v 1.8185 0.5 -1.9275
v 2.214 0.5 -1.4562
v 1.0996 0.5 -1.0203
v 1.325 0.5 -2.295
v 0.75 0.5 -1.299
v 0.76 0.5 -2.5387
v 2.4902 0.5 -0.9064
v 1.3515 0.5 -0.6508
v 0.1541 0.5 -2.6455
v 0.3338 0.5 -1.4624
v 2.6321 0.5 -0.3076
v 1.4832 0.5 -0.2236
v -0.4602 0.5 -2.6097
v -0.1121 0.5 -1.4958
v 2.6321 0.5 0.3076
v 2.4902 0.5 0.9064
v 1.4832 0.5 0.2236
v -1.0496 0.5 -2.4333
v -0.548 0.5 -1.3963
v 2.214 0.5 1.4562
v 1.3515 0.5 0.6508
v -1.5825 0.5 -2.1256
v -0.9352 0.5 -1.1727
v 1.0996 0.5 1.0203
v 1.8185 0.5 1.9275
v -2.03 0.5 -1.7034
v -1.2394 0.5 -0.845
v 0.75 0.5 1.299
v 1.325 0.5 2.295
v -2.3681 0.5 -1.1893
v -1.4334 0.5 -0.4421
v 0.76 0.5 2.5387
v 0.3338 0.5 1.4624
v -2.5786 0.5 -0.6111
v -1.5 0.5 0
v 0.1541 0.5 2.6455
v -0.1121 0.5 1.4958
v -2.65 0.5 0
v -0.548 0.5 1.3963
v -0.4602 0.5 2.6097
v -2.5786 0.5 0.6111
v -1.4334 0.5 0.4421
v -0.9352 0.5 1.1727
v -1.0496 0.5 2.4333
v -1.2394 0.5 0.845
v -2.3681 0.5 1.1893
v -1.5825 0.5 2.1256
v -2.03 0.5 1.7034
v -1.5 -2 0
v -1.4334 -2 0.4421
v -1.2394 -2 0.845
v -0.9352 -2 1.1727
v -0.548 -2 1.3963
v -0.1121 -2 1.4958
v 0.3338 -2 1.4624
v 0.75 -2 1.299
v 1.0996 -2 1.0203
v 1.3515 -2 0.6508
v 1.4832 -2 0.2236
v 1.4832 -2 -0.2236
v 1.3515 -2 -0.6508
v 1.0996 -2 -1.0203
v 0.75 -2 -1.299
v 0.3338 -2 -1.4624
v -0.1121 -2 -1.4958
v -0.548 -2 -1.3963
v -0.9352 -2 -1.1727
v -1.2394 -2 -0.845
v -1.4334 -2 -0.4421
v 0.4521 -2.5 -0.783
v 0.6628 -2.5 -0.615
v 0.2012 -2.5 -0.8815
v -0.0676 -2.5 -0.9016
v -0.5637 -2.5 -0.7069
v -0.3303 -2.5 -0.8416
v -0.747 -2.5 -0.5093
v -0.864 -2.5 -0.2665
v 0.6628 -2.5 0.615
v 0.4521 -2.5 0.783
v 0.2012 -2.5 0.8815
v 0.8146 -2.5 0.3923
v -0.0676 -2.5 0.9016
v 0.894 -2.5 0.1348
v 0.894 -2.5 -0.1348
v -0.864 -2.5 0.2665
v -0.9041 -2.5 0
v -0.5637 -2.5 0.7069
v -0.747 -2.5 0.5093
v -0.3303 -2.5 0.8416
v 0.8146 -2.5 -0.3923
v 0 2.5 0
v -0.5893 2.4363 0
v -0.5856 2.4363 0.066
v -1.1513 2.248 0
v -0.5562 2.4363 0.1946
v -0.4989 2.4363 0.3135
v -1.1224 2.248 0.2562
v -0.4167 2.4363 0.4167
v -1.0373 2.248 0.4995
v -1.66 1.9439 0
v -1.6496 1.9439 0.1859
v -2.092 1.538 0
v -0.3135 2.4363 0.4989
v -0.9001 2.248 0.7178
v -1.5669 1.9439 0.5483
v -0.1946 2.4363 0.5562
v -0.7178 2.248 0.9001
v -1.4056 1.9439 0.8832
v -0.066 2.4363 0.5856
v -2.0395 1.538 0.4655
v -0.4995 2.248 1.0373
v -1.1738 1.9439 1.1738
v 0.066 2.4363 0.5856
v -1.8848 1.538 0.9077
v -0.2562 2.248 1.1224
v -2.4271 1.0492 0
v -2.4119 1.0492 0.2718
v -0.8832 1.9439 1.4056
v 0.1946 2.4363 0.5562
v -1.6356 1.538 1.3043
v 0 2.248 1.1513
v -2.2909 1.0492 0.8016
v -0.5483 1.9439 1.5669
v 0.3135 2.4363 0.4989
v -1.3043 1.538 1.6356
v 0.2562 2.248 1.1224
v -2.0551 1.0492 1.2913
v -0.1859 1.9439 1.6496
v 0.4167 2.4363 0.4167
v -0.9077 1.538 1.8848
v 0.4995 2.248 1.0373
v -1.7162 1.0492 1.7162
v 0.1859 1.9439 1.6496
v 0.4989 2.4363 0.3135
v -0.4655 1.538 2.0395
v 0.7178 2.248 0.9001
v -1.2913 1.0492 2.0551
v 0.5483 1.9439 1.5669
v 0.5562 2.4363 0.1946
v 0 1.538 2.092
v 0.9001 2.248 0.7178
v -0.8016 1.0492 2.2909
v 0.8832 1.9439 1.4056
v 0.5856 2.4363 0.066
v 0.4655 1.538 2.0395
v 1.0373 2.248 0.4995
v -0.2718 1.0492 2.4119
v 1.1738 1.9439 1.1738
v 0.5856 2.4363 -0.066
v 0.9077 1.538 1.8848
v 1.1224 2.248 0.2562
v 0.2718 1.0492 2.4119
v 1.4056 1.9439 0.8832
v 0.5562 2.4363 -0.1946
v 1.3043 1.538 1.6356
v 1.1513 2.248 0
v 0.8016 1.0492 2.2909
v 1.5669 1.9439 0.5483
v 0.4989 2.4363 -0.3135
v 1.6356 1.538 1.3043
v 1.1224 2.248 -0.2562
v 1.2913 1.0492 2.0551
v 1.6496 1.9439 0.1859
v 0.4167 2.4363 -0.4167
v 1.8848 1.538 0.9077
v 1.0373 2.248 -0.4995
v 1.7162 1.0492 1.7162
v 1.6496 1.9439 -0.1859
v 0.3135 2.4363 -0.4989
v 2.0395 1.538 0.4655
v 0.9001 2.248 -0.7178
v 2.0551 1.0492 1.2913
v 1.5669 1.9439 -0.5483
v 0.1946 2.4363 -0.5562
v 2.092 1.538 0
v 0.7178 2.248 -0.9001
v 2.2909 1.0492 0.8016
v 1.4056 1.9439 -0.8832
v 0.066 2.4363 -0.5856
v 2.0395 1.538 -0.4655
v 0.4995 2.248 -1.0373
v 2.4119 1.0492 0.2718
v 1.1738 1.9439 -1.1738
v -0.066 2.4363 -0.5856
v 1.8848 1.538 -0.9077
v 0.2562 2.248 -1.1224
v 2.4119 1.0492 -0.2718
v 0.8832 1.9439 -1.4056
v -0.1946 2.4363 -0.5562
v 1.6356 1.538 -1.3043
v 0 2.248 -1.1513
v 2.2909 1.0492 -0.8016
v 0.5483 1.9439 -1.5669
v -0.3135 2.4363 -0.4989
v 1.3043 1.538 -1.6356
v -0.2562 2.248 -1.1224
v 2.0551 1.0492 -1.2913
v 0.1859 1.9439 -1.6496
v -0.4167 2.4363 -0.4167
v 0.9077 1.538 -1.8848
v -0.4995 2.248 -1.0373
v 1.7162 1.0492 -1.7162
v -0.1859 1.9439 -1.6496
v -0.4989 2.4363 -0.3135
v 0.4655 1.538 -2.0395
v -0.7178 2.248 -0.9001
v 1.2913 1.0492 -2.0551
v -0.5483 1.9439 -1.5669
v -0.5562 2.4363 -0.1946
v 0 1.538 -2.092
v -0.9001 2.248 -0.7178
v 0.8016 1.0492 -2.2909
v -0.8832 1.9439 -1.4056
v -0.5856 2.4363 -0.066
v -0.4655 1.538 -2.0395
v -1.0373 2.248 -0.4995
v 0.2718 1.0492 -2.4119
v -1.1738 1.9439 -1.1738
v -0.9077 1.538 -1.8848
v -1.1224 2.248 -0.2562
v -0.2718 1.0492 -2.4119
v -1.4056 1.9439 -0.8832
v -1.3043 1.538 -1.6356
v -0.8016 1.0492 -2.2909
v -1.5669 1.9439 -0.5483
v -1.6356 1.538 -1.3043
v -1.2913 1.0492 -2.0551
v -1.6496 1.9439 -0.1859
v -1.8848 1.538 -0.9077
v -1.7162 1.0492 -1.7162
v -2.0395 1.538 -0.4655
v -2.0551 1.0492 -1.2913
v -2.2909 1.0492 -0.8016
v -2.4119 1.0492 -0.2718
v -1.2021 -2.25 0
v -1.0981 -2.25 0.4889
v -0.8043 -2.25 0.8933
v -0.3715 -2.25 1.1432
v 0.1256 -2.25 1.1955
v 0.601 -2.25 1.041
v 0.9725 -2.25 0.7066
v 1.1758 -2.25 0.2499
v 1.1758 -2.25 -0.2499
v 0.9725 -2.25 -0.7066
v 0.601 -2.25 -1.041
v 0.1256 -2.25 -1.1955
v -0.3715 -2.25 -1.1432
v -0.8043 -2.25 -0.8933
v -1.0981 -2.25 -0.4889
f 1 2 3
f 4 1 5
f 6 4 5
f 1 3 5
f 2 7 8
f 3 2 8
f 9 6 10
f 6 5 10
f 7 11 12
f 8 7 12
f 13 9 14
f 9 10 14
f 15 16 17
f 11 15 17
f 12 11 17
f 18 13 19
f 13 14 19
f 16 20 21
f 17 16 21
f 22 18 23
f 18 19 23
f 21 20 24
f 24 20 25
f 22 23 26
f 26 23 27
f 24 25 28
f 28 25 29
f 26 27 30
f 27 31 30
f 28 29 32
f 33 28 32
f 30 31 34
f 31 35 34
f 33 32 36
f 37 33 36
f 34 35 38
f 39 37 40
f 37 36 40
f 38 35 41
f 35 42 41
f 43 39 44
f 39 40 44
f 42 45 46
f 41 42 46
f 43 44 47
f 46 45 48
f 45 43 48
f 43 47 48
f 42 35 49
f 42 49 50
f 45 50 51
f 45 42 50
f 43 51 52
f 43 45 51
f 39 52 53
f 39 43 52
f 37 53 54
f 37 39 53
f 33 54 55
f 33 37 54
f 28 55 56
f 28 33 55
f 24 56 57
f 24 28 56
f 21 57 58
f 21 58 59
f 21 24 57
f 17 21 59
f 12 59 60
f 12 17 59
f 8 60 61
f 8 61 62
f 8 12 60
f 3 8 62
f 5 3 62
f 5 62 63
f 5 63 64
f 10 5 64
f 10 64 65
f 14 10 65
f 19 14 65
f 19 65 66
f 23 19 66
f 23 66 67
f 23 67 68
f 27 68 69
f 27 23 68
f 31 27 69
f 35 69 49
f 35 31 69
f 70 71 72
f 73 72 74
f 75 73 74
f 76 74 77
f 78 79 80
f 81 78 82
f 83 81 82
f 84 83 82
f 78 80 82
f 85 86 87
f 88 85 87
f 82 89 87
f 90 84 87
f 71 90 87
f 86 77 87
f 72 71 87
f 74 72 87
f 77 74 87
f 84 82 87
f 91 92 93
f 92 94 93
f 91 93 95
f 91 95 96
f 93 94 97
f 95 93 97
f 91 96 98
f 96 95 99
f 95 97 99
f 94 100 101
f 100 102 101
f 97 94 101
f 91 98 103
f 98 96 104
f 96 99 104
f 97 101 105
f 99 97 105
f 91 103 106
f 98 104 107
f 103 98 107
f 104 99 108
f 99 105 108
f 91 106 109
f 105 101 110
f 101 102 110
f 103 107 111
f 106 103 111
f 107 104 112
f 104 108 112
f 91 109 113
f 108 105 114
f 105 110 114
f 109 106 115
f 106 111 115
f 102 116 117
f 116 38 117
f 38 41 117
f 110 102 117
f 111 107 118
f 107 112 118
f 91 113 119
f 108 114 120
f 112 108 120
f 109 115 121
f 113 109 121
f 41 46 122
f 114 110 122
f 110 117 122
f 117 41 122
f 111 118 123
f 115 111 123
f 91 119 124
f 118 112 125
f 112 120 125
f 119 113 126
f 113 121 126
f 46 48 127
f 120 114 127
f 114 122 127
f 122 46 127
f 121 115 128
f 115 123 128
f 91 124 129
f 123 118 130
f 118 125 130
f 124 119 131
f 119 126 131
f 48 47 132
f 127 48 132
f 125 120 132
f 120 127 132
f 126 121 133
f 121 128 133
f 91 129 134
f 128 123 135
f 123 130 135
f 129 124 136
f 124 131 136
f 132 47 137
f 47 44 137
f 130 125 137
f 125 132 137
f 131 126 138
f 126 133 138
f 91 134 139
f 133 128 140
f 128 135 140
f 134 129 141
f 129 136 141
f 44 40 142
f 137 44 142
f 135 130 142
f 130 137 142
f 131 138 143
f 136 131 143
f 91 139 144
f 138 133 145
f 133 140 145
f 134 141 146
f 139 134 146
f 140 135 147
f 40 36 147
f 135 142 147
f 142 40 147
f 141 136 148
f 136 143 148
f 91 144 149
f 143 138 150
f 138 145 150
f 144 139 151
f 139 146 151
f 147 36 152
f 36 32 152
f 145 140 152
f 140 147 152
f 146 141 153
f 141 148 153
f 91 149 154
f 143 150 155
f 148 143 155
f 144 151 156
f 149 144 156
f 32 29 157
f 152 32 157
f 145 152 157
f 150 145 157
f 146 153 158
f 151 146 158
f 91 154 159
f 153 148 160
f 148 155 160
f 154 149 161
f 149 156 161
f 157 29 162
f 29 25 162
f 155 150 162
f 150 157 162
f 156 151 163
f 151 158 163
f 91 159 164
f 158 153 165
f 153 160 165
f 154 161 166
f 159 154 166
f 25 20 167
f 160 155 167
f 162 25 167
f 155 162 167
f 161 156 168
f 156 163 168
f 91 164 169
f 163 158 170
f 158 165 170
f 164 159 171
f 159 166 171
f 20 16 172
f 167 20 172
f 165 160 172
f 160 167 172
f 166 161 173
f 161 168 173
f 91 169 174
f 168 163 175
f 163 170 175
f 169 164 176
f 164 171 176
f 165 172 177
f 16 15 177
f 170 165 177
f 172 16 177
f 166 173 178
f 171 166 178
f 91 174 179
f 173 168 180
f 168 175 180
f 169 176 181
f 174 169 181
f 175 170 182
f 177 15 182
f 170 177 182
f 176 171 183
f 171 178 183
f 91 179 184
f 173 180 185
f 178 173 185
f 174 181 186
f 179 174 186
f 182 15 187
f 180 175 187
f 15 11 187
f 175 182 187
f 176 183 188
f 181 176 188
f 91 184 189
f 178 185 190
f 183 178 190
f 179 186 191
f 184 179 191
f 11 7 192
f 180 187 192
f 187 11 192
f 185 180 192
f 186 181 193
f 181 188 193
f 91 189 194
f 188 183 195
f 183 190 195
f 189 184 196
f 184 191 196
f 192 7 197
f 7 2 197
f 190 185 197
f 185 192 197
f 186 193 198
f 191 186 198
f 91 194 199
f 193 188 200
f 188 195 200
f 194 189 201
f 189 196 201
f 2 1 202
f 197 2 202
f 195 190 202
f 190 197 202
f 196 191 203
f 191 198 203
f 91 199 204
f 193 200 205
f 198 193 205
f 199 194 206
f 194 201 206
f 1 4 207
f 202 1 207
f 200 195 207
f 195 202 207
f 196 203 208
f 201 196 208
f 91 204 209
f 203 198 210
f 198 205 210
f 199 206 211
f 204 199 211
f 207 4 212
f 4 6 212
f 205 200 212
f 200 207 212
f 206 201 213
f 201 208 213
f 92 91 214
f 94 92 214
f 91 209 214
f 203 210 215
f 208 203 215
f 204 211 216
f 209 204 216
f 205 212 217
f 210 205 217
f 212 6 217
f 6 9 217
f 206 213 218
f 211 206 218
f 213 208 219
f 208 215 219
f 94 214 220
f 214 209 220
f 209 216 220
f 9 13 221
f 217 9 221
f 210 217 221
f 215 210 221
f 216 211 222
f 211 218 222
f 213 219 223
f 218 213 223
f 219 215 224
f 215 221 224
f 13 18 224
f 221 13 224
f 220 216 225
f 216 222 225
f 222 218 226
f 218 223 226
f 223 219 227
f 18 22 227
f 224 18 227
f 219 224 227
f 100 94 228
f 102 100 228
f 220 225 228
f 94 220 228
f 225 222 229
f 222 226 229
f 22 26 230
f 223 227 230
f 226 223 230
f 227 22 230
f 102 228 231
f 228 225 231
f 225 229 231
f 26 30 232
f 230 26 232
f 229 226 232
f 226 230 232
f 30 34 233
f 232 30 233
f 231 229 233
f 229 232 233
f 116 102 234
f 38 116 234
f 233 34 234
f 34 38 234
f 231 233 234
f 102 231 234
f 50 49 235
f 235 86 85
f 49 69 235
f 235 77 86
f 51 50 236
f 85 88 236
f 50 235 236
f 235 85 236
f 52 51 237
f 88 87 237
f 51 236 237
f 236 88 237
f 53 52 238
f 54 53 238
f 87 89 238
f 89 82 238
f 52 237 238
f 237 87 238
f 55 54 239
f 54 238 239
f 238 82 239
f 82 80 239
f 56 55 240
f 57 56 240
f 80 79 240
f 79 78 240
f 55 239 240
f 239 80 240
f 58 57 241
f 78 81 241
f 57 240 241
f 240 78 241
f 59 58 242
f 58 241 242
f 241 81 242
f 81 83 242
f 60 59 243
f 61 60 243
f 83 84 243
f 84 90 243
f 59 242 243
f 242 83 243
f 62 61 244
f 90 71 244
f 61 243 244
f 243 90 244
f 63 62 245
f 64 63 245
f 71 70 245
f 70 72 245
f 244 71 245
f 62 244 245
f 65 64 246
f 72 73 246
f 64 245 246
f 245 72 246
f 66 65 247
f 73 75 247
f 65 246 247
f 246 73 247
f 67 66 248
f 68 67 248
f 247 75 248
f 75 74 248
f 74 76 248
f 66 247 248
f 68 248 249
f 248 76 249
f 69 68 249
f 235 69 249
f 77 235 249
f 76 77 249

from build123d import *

# Parameters (mm, degrees)
SKIZZE1_W   = 2.65
SKIZZE1_H   = 5
SKIZZE2_W   = 1.15
SKIZZE2_H   = 3
FASE1_SIZE  = 0.5
FASE1_SIZE2 = 0.595876796


with BuildPart() as part:
    # Skizze1 → Rotation1 (revolve)
    with BuildSketch(Plane.XY):
        with Locations((-1.325, 0)):
            Rectangle(SKIZZE1_W, SKIZZE1_H)
    revolve(axis=Axis((0, -7.45771041, 0), (0, 1, 0)))

    # Skizze2 → Schnitt-Rotation1 (revolve, cut)
    with BuildSketch(Plane.XY):
        with Locations((-2.075, -1)):
            Rectangle(SKIZZE2_W, SKIZZE2_H)
    revolve(axis=Axis((0, -7.45771041, 0), (0, 1, 0)), mode=Mode.SUBTRACT)

    # Skizze3 → Schnitt-Rotation2 (revolve, cut)
    with BuildSketch(Plane.XY):
        with BuildLine():
            Line((-2.65, 0.5), (-4.39181551, 0.5))
            Line((-4.39181551, 0.5), (-4.39181551, 3.889875423))
            Line((-4.39181551, 3.889875423), (0, 3.889875423))
            Line((0, 3.889875423), (0, 2.5))
            ThreePointArc((0, 2.5), (-1.66000753, 1.943884977), (-2.65, 0.5))
        make_face()
    revolve(axis=Axis((0, -7.45771041, 0), (0, 1, 0)), mode=Mode.SUBTRACT)

    # Fase1
    fase1_edges = [part.edges().sort_by_distance(p)[0] for p in [
        (1.5, -2.5, 0),
    ]]
    fase1_side = [part.faces().sort_by_distance(p)[0] for p in [
        (1.5, -1, 0),
    ]]
    chamfer(fase1_edges, length=FASE1_SIZE, length2=FASE1_SIZE2, reference=fase1_side[0])


solid = part.part
